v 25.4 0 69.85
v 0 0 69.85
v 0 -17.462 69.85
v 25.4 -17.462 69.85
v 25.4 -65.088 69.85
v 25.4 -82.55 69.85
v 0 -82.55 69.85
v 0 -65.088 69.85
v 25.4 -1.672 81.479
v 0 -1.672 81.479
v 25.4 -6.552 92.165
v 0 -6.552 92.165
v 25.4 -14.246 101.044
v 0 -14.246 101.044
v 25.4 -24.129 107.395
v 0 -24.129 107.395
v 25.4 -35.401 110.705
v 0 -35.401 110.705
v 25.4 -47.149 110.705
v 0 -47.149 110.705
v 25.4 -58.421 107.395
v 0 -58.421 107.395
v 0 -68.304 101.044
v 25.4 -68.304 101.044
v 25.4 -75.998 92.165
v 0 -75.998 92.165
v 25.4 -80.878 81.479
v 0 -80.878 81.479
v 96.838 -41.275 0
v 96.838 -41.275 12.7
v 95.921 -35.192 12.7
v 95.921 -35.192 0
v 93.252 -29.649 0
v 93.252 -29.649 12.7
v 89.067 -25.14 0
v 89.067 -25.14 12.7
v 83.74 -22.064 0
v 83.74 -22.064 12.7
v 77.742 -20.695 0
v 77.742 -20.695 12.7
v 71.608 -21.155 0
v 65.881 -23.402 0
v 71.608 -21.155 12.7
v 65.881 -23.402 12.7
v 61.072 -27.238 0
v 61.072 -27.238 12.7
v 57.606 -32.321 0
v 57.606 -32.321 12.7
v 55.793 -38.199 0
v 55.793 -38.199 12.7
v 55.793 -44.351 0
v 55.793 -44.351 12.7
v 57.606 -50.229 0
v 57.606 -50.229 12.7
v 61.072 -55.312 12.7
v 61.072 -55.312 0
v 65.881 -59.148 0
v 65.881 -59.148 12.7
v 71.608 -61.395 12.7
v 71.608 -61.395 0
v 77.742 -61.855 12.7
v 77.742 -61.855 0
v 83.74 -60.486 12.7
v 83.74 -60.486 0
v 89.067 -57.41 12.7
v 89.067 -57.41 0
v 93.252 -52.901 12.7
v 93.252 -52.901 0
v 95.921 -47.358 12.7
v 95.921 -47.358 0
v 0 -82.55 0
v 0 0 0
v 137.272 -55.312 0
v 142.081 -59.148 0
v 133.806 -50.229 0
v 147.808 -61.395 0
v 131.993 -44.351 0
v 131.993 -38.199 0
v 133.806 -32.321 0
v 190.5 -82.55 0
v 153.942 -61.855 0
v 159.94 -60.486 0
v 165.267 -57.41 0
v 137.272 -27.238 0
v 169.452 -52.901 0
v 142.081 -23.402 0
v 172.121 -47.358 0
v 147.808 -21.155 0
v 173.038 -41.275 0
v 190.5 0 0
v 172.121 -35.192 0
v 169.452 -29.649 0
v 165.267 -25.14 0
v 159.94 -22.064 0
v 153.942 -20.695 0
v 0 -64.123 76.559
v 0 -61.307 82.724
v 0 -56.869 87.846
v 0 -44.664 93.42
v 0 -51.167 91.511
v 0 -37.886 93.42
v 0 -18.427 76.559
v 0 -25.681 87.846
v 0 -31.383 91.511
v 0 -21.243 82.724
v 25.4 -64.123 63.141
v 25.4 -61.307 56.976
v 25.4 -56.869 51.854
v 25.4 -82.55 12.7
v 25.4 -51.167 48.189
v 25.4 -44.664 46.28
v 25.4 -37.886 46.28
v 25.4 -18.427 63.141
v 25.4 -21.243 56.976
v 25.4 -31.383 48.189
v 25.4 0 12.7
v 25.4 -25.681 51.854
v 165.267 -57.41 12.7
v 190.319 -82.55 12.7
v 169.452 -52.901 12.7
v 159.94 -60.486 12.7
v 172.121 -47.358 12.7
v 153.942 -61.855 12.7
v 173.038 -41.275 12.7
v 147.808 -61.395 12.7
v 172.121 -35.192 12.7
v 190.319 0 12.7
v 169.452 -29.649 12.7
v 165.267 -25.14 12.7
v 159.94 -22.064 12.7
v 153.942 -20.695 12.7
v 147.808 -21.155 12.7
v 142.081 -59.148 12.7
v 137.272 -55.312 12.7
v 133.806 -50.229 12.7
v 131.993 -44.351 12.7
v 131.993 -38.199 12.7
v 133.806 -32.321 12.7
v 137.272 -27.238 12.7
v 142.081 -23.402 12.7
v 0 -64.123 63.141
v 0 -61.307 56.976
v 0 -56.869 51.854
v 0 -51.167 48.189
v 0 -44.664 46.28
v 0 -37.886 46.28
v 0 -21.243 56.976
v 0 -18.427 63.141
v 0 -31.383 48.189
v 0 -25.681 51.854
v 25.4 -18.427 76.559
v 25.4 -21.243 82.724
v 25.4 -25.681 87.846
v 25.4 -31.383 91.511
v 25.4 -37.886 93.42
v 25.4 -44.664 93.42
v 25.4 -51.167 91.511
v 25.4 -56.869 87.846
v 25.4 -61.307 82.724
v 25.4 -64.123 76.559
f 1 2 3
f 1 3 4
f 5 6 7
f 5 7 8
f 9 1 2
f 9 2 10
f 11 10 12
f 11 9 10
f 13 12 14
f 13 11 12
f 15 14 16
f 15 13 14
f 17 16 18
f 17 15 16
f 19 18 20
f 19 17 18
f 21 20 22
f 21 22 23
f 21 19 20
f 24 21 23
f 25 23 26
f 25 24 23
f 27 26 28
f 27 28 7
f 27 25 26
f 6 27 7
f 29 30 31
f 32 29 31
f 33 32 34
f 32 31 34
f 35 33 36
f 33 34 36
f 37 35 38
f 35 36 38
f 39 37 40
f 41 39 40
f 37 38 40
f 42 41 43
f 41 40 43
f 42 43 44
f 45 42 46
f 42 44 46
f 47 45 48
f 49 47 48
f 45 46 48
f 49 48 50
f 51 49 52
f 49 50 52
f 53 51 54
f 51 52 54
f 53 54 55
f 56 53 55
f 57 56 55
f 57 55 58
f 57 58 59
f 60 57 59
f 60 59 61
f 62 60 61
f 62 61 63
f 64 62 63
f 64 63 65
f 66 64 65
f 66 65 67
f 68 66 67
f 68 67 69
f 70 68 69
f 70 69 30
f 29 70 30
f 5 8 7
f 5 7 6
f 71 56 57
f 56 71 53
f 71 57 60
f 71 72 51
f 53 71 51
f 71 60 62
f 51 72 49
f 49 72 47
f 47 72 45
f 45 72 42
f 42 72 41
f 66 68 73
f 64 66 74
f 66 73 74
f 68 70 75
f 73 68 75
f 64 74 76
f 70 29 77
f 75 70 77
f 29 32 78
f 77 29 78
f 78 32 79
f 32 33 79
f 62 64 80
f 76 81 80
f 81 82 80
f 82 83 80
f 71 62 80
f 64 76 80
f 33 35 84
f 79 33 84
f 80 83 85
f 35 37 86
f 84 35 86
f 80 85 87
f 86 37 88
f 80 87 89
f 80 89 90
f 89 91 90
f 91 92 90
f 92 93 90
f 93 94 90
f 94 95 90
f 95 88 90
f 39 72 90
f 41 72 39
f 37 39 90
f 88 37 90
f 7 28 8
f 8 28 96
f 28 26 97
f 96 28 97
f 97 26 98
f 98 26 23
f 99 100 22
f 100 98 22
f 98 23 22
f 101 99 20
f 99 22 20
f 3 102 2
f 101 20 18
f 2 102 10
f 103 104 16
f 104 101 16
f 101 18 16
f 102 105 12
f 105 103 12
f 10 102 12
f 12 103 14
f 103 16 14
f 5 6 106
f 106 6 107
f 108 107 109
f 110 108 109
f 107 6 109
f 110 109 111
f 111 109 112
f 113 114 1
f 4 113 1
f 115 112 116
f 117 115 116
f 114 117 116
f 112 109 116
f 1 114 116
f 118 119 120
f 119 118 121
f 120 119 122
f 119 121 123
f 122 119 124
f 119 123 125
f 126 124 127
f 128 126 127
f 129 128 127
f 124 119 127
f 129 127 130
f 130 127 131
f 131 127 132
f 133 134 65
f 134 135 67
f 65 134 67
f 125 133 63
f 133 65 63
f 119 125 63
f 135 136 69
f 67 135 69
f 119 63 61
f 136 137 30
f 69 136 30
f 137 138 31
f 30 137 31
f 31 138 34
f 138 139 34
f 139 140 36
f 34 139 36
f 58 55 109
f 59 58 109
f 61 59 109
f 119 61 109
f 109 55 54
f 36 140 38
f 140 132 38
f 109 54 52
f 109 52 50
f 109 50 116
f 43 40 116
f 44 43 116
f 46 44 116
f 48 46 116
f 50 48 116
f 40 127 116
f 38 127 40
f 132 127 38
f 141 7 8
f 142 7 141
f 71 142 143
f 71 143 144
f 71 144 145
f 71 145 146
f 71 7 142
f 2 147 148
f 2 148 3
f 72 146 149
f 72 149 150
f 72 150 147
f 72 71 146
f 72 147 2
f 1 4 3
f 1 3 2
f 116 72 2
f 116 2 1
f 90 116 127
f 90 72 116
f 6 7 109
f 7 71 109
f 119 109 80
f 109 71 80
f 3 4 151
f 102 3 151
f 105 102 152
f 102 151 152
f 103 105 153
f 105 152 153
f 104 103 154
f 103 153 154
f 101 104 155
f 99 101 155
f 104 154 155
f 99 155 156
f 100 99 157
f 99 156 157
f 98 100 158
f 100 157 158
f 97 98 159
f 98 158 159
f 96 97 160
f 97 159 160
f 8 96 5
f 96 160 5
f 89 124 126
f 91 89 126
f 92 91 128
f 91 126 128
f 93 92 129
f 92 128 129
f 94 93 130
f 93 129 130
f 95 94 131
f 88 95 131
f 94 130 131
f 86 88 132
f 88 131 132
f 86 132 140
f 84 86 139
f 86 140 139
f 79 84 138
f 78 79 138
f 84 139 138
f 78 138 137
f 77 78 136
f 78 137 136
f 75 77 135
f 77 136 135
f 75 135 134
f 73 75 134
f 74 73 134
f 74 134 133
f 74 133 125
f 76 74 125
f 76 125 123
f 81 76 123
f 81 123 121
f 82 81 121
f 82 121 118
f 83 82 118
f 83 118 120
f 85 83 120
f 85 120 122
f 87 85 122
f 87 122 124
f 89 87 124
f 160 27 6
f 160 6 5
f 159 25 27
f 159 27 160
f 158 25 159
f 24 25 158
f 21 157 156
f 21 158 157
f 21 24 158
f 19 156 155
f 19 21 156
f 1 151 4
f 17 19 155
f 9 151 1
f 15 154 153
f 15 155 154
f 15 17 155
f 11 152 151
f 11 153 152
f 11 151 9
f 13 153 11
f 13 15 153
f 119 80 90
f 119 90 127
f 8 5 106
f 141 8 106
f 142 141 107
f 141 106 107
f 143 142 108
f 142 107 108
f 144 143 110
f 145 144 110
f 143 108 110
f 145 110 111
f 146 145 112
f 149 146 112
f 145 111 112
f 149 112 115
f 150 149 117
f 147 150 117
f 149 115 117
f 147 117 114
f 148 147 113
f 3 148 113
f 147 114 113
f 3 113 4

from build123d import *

# Parameters (mm, degrees)
F1_DEPTH  = 82.55
F2_W      = 25.4
F2_H      = 82.55
F3_DEPTH  = 57.15
F5_DEPTH  = 25.4
F7_R      = 23.8125
F6_R      = 23.8125
F8_DEPTH  = 25.401
F9_DEPTH  = 25.401
F10_R     = 20.6375
F11_DEPTH = 25.4


with BuildPart() as f1:
    # F0 (on Front) → F1 (new body)
    with BuildSketch(Plane.XZ):
        Polygon((0, 12.7), (0, 0), (190.5, 0), (190.3187632561, 12.7), align=None)
    extrude(amount=F1_DEPTH)

    # F2 (on face) → F3 (join)
    with BuildSketch(Plane.XY.offset(12.7)):
        with Locations((12.7, -41.275)):
            Rectangle(F2_W, F2_H)
    extrude(amount=F3_DEPTH)


with BuildPart() as f5:
    # F4 (on face) → F5 (new body)
    with BuildSketch(Plane.YZ.offset(25.4)):
        with BuildLine():
            Line((-82.55, 69.85), (0, 69.85))
            ThreePointArc((0, 69.85), (-41.275, 111.125), (-82.55, 69.85))
        make_face()
    extrude(amount=-F5_DEPTH)


with BuildPart() as f8_tool:
    # F7 (on face) + F6 (on face) → F8 (new body, through all)
    with BuildSketch(Plane.YZ.offset(25.4)):
        with Locations((-41.275, 69.85)):
            Circle(F7_R)
    with BuildSketch(Plane.YZ.offset(25.4)):
        with Locations((-41.275, 69.85)):
            Circle(F6_R)
        with BuildLine():
            Line((-65.0875, 69.85), (-17.4625, 69.85))
            ThreePointArc((-17.4625, 69.85), (-41.275, 93.6625), (-65.0875, 69.85))
        make_face()
        with BuildLine():
            ThreePointArc((-65.0875, 69.85), (-41.275, 46.0375), (-17.4625, 69.85))
            Line((-17.4625, 69.85), (-65.0875, 69.85))
        make_face()
    extrude(amount=-F8_DEPTH)


with BuildPart() as f1_1:
    add(f1.part)

    # F8: cut by f8_tool
    add(f8_tool.part, mode=Mode.SUBTRACT)

    # F6 (on face) → F9 (cut, through all)
    with BuildSketch(Plane.YZ.offset(25.4)):
        with Locations((-41.275, 69.85)):
            Circle(F6_R)
    extrude(amount=-F9_DEPTH, mode=Mode.SUBTRACT)

    # F10 (on face) → F11 (cut)
    with BuildSketch(Plane.XY.offset(12.7)):
        with Locations((76.2, -41.275)):
            Circle(F10_R)
        with Locations((152.4, -41.275)):
            Circle(F10_R)
    extrude(amount=-F11_DEPTH, mode=Mode.SUBTRACT)


with BuildPart() as f5_1:
    add(f5.part)

    # F8: cut by f8_tool
    add(f8_tool.part, mode=Mode.SUBTRACT)


solid = Compound([f1_1.part, f5_1.part])
